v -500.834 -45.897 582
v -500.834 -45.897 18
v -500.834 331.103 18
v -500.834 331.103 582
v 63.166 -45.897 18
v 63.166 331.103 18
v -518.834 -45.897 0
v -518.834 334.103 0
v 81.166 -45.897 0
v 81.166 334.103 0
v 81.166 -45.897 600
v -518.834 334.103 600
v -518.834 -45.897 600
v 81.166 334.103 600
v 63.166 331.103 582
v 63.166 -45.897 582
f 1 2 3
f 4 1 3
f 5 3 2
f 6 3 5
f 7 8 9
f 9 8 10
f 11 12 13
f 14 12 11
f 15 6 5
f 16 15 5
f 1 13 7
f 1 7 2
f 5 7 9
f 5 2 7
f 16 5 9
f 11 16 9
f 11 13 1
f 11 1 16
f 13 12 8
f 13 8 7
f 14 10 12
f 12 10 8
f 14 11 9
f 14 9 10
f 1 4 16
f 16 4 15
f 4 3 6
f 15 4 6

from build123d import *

# Parameters (mm, degrees)
F2_DEPTH = 600
F1_W     = 600
F1_H     = 380
F3_DEPTH = 18
F4_W     = 564
F4_H     = 377
F5_DEPTH = 18


with BuildPart() as f2:
    # F0 (on Top) → F2 (new body)
    with BuildSketch(Plane.XY):
        Polygon((81.165642, 334.102758), (-518.834358, 334.102758), (-518.834358, -45.897242), (-500.834358, -45.897242), (-500.834358, 331.102758), (63.165642, 331.102758), (63.165642, -45.897242), (81.165642, -45.897242), align=None)
    extrude(amount=F2_DEPTH)

    # F1 (on Top) → F3 (join)
    with BuildSketch(Plane.XY):
        with Locations((-218.834358, 144.102758)):
            Rectangle(F1_W, F1_H)
    extrude(amount=F3_DEPTH)

    # F4 (on face) → F5 (join)
    with BuildSketch(Plane.XY.offset(600)):
        with Locations((-218.834358, 142.602758)):
            Rectangle(F4_W, F4_H)
    extrude(amount=-F5_DEPTH)


solid = f2.part
